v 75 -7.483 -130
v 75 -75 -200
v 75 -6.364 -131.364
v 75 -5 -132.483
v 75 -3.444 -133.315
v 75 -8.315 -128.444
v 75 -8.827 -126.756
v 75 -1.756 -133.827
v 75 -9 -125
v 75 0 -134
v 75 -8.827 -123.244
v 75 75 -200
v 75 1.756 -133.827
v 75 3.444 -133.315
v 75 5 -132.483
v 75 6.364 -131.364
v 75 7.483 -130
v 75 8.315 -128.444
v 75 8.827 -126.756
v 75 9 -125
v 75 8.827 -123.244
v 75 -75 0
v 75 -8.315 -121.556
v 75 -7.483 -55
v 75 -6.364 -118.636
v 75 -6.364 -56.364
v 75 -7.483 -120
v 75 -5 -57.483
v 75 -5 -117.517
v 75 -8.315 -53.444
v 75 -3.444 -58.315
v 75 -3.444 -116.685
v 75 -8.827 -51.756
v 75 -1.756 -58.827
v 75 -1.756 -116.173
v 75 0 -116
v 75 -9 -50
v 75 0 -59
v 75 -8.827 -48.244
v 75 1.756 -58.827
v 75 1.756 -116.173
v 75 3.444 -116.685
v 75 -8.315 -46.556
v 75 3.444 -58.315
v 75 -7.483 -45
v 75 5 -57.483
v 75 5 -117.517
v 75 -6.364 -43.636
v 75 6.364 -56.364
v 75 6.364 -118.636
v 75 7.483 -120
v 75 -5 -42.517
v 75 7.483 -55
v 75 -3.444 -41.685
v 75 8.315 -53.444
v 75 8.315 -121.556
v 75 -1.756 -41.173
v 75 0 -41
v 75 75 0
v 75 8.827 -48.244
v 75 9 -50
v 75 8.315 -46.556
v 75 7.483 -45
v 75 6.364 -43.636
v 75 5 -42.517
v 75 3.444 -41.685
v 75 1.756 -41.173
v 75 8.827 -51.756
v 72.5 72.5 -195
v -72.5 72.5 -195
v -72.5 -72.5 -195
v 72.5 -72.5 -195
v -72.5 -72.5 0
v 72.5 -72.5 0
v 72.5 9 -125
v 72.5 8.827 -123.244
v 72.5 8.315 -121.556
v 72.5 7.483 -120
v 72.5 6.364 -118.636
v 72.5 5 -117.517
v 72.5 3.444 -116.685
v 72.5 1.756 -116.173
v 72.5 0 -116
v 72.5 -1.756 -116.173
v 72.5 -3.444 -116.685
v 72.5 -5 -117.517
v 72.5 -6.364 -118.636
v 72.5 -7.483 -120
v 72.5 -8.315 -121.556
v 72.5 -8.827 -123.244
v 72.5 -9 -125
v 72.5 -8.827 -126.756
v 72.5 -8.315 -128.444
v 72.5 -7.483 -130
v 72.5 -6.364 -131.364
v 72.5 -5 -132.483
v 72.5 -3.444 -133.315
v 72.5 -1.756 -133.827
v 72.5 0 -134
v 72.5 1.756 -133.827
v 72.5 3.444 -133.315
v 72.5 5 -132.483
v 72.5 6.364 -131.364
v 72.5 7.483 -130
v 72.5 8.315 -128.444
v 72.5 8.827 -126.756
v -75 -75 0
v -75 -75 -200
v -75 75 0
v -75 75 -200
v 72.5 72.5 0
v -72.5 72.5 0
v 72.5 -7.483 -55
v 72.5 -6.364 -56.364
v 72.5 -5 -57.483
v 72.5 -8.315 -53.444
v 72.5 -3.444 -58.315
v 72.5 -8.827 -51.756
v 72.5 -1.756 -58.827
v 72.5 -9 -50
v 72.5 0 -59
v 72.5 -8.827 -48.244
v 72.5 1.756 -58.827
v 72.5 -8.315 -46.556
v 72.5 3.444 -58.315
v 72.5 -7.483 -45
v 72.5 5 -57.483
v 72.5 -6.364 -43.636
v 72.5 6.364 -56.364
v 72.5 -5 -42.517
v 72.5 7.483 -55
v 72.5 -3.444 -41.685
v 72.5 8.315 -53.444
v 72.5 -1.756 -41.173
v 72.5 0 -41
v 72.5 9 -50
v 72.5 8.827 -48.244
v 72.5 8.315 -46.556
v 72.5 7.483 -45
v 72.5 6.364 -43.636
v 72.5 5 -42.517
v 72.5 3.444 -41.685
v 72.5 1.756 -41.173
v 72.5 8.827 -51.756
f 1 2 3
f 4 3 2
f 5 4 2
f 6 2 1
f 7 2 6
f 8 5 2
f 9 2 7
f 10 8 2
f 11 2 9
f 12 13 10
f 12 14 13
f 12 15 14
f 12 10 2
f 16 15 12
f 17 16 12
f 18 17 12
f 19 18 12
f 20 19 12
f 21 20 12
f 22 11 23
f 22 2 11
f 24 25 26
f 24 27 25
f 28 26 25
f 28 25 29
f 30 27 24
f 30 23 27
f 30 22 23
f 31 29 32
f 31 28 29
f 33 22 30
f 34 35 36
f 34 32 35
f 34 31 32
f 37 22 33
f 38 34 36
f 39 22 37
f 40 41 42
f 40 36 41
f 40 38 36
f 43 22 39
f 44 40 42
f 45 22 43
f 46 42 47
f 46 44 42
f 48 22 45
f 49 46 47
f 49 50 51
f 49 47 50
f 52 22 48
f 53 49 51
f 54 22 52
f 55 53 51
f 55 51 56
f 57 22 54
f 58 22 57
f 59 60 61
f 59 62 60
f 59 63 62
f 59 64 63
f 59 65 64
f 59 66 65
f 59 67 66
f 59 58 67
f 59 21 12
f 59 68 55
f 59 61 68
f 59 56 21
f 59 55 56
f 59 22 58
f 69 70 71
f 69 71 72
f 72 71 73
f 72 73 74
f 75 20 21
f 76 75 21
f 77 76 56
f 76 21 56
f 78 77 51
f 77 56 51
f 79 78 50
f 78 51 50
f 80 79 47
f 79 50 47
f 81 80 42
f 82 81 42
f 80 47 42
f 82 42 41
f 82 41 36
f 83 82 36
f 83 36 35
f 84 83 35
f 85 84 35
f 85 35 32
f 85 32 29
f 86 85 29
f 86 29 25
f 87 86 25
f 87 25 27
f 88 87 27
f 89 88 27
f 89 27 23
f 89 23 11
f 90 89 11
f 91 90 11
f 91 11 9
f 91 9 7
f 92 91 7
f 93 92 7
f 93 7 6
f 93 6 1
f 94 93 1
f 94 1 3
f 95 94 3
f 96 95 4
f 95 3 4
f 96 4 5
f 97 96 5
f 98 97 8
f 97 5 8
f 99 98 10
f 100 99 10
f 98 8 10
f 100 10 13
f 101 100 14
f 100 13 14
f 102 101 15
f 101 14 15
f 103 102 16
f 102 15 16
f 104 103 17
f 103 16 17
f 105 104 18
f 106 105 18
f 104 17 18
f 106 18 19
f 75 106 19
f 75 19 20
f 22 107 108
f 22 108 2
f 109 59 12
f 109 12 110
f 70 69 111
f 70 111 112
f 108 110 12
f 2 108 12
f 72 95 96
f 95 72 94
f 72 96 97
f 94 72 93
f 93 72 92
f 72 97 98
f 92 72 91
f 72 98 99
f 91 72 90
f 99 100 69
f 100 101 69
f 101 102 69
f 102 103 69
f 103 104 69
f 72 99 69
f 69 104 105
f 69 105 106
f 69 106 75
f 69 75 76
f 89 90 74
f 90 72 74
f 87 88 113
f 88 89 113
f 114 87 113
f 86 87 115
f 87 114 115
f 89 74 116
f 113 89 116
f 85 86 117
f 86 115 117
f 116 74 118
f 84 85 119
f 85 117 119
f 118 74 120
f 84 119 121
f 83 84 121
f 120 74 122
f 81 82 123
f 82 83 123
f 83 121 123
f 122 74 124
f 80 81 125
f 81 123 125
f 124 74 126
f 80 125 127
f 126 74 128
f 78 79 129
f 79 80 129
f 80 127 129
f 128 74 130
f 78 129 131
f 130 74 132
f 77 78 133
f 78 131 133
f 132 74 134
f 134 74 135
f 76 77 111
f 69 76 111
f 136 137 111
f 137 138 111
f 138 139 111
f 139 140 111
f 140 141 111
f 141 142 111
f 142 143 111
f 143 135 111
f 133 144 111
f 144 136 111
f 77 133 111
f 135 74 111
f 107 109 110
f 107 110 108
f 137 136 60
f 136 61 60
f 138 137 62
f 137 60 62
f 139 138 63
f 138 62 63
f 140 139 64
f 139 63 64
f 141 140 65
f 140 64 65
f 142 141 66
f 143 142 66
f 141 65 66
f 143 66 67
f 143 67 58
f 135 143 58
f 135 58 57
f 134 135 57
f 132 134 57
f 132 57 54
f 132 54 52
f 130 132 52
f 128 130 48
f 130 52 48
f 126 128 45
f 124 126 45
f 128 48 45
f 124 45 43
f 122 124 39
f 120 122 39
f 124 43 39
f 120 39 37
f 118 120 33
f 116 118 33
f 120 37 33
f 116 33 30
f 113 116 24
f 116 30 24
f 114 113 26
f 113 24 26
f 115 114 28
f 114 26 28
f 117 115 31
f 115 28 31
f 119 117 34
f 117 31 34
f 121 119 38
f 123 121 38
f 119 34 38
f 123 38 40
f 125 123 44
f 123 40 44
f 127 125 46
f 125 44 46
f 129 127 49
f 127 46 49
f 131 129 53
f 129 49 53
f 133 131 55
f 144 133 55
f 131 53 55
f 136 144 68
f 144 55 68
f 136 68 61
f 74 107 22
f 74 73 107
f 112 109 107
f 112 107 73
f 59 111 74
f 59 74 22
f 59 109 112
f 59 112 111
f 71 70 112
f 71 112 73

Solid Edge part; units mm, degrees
sketch "Sketch1" plane through (0, 0, 0) normal (0, 0, 1) x (1, 0, 0)
  line L0 (75, 75) -> (-75, 75)
  line L1 (-75, 75) -> (-75, -75)
  line L2 (-75, -75) -> (75, -75)
  line L3 (75, -75) -> (75, 75)
extrude "Protrusion1" add sketch "Sketch1" against normal blind 200
sketch "Sketch2" plane through (0, 0, 0) normal (0, 0, 1) x (1, 0, 0)
  line L0 (147.5, -147.5) -> (147.5, 147.5)
  line L1 (147.5, 147.5) -> (-147.5, 147.5)
  line L2 (-147.5, 147.5) -> (-147.5, -147.5)
  line L3 (-147.5, -147.5) -> (147.5, -147.5)
extrude "VaciadoExtruido_1" cut sketch "Sketch2" against normal blind 195
extrude "VaciadoExtruido_2" [suppressed]
extrude "VaciadoExtruido_3" [suppressed]
sketch "Sketch3" plane through (0, 0, 0) normal (0, 0, 1) x (1, 0, 0)
  line L0 (75, -75) -> (75, 75)
  line L1 (75, 75) -> (-75, 75)
  line L2 (-75, 75) -> (-75, -75)
  line L3 (-75, -75) -> (75, -75)
extrude "ProtrusiónExtruida_2" add sketch "Sketch3" against normal blind 200
sketch "Sketch4" plane through (0, 0, 0) normal (0, 0, 1) x (1, 0, 0)
  line L0 (72.5, -72.5) -> (72.5, 72.5)
  line L1 (72.5, 72.5) -> (-72.5, 72.5)
  line L2 (-72.5, 72.5) -> (-72.5, -72.5)
  line L3 (-72.5, -72.5) -> (72.5, -72.5)
extrude "VaciadoExtruido_4" cut sketch "Sketch4" against normal blind 195
sketch "Sketch5" plane through (75, 0, -100) normal (1, 0, 0) x (0, 1, 0)
  circle A0 centre (0, 50) radius 9
extrude "VaciadoExtruido_5" cut sketch "Sketch5" against normal blind 5
sketch "Sketch6" plane through (75, 0, -100) normal (1, 0, 0) x (0, 1, 0)
  circle A0 centre (0, -25) radius 9
extrude "VaciadoExtruido_6" cut sketch "Sketch6" against normal blind 5
